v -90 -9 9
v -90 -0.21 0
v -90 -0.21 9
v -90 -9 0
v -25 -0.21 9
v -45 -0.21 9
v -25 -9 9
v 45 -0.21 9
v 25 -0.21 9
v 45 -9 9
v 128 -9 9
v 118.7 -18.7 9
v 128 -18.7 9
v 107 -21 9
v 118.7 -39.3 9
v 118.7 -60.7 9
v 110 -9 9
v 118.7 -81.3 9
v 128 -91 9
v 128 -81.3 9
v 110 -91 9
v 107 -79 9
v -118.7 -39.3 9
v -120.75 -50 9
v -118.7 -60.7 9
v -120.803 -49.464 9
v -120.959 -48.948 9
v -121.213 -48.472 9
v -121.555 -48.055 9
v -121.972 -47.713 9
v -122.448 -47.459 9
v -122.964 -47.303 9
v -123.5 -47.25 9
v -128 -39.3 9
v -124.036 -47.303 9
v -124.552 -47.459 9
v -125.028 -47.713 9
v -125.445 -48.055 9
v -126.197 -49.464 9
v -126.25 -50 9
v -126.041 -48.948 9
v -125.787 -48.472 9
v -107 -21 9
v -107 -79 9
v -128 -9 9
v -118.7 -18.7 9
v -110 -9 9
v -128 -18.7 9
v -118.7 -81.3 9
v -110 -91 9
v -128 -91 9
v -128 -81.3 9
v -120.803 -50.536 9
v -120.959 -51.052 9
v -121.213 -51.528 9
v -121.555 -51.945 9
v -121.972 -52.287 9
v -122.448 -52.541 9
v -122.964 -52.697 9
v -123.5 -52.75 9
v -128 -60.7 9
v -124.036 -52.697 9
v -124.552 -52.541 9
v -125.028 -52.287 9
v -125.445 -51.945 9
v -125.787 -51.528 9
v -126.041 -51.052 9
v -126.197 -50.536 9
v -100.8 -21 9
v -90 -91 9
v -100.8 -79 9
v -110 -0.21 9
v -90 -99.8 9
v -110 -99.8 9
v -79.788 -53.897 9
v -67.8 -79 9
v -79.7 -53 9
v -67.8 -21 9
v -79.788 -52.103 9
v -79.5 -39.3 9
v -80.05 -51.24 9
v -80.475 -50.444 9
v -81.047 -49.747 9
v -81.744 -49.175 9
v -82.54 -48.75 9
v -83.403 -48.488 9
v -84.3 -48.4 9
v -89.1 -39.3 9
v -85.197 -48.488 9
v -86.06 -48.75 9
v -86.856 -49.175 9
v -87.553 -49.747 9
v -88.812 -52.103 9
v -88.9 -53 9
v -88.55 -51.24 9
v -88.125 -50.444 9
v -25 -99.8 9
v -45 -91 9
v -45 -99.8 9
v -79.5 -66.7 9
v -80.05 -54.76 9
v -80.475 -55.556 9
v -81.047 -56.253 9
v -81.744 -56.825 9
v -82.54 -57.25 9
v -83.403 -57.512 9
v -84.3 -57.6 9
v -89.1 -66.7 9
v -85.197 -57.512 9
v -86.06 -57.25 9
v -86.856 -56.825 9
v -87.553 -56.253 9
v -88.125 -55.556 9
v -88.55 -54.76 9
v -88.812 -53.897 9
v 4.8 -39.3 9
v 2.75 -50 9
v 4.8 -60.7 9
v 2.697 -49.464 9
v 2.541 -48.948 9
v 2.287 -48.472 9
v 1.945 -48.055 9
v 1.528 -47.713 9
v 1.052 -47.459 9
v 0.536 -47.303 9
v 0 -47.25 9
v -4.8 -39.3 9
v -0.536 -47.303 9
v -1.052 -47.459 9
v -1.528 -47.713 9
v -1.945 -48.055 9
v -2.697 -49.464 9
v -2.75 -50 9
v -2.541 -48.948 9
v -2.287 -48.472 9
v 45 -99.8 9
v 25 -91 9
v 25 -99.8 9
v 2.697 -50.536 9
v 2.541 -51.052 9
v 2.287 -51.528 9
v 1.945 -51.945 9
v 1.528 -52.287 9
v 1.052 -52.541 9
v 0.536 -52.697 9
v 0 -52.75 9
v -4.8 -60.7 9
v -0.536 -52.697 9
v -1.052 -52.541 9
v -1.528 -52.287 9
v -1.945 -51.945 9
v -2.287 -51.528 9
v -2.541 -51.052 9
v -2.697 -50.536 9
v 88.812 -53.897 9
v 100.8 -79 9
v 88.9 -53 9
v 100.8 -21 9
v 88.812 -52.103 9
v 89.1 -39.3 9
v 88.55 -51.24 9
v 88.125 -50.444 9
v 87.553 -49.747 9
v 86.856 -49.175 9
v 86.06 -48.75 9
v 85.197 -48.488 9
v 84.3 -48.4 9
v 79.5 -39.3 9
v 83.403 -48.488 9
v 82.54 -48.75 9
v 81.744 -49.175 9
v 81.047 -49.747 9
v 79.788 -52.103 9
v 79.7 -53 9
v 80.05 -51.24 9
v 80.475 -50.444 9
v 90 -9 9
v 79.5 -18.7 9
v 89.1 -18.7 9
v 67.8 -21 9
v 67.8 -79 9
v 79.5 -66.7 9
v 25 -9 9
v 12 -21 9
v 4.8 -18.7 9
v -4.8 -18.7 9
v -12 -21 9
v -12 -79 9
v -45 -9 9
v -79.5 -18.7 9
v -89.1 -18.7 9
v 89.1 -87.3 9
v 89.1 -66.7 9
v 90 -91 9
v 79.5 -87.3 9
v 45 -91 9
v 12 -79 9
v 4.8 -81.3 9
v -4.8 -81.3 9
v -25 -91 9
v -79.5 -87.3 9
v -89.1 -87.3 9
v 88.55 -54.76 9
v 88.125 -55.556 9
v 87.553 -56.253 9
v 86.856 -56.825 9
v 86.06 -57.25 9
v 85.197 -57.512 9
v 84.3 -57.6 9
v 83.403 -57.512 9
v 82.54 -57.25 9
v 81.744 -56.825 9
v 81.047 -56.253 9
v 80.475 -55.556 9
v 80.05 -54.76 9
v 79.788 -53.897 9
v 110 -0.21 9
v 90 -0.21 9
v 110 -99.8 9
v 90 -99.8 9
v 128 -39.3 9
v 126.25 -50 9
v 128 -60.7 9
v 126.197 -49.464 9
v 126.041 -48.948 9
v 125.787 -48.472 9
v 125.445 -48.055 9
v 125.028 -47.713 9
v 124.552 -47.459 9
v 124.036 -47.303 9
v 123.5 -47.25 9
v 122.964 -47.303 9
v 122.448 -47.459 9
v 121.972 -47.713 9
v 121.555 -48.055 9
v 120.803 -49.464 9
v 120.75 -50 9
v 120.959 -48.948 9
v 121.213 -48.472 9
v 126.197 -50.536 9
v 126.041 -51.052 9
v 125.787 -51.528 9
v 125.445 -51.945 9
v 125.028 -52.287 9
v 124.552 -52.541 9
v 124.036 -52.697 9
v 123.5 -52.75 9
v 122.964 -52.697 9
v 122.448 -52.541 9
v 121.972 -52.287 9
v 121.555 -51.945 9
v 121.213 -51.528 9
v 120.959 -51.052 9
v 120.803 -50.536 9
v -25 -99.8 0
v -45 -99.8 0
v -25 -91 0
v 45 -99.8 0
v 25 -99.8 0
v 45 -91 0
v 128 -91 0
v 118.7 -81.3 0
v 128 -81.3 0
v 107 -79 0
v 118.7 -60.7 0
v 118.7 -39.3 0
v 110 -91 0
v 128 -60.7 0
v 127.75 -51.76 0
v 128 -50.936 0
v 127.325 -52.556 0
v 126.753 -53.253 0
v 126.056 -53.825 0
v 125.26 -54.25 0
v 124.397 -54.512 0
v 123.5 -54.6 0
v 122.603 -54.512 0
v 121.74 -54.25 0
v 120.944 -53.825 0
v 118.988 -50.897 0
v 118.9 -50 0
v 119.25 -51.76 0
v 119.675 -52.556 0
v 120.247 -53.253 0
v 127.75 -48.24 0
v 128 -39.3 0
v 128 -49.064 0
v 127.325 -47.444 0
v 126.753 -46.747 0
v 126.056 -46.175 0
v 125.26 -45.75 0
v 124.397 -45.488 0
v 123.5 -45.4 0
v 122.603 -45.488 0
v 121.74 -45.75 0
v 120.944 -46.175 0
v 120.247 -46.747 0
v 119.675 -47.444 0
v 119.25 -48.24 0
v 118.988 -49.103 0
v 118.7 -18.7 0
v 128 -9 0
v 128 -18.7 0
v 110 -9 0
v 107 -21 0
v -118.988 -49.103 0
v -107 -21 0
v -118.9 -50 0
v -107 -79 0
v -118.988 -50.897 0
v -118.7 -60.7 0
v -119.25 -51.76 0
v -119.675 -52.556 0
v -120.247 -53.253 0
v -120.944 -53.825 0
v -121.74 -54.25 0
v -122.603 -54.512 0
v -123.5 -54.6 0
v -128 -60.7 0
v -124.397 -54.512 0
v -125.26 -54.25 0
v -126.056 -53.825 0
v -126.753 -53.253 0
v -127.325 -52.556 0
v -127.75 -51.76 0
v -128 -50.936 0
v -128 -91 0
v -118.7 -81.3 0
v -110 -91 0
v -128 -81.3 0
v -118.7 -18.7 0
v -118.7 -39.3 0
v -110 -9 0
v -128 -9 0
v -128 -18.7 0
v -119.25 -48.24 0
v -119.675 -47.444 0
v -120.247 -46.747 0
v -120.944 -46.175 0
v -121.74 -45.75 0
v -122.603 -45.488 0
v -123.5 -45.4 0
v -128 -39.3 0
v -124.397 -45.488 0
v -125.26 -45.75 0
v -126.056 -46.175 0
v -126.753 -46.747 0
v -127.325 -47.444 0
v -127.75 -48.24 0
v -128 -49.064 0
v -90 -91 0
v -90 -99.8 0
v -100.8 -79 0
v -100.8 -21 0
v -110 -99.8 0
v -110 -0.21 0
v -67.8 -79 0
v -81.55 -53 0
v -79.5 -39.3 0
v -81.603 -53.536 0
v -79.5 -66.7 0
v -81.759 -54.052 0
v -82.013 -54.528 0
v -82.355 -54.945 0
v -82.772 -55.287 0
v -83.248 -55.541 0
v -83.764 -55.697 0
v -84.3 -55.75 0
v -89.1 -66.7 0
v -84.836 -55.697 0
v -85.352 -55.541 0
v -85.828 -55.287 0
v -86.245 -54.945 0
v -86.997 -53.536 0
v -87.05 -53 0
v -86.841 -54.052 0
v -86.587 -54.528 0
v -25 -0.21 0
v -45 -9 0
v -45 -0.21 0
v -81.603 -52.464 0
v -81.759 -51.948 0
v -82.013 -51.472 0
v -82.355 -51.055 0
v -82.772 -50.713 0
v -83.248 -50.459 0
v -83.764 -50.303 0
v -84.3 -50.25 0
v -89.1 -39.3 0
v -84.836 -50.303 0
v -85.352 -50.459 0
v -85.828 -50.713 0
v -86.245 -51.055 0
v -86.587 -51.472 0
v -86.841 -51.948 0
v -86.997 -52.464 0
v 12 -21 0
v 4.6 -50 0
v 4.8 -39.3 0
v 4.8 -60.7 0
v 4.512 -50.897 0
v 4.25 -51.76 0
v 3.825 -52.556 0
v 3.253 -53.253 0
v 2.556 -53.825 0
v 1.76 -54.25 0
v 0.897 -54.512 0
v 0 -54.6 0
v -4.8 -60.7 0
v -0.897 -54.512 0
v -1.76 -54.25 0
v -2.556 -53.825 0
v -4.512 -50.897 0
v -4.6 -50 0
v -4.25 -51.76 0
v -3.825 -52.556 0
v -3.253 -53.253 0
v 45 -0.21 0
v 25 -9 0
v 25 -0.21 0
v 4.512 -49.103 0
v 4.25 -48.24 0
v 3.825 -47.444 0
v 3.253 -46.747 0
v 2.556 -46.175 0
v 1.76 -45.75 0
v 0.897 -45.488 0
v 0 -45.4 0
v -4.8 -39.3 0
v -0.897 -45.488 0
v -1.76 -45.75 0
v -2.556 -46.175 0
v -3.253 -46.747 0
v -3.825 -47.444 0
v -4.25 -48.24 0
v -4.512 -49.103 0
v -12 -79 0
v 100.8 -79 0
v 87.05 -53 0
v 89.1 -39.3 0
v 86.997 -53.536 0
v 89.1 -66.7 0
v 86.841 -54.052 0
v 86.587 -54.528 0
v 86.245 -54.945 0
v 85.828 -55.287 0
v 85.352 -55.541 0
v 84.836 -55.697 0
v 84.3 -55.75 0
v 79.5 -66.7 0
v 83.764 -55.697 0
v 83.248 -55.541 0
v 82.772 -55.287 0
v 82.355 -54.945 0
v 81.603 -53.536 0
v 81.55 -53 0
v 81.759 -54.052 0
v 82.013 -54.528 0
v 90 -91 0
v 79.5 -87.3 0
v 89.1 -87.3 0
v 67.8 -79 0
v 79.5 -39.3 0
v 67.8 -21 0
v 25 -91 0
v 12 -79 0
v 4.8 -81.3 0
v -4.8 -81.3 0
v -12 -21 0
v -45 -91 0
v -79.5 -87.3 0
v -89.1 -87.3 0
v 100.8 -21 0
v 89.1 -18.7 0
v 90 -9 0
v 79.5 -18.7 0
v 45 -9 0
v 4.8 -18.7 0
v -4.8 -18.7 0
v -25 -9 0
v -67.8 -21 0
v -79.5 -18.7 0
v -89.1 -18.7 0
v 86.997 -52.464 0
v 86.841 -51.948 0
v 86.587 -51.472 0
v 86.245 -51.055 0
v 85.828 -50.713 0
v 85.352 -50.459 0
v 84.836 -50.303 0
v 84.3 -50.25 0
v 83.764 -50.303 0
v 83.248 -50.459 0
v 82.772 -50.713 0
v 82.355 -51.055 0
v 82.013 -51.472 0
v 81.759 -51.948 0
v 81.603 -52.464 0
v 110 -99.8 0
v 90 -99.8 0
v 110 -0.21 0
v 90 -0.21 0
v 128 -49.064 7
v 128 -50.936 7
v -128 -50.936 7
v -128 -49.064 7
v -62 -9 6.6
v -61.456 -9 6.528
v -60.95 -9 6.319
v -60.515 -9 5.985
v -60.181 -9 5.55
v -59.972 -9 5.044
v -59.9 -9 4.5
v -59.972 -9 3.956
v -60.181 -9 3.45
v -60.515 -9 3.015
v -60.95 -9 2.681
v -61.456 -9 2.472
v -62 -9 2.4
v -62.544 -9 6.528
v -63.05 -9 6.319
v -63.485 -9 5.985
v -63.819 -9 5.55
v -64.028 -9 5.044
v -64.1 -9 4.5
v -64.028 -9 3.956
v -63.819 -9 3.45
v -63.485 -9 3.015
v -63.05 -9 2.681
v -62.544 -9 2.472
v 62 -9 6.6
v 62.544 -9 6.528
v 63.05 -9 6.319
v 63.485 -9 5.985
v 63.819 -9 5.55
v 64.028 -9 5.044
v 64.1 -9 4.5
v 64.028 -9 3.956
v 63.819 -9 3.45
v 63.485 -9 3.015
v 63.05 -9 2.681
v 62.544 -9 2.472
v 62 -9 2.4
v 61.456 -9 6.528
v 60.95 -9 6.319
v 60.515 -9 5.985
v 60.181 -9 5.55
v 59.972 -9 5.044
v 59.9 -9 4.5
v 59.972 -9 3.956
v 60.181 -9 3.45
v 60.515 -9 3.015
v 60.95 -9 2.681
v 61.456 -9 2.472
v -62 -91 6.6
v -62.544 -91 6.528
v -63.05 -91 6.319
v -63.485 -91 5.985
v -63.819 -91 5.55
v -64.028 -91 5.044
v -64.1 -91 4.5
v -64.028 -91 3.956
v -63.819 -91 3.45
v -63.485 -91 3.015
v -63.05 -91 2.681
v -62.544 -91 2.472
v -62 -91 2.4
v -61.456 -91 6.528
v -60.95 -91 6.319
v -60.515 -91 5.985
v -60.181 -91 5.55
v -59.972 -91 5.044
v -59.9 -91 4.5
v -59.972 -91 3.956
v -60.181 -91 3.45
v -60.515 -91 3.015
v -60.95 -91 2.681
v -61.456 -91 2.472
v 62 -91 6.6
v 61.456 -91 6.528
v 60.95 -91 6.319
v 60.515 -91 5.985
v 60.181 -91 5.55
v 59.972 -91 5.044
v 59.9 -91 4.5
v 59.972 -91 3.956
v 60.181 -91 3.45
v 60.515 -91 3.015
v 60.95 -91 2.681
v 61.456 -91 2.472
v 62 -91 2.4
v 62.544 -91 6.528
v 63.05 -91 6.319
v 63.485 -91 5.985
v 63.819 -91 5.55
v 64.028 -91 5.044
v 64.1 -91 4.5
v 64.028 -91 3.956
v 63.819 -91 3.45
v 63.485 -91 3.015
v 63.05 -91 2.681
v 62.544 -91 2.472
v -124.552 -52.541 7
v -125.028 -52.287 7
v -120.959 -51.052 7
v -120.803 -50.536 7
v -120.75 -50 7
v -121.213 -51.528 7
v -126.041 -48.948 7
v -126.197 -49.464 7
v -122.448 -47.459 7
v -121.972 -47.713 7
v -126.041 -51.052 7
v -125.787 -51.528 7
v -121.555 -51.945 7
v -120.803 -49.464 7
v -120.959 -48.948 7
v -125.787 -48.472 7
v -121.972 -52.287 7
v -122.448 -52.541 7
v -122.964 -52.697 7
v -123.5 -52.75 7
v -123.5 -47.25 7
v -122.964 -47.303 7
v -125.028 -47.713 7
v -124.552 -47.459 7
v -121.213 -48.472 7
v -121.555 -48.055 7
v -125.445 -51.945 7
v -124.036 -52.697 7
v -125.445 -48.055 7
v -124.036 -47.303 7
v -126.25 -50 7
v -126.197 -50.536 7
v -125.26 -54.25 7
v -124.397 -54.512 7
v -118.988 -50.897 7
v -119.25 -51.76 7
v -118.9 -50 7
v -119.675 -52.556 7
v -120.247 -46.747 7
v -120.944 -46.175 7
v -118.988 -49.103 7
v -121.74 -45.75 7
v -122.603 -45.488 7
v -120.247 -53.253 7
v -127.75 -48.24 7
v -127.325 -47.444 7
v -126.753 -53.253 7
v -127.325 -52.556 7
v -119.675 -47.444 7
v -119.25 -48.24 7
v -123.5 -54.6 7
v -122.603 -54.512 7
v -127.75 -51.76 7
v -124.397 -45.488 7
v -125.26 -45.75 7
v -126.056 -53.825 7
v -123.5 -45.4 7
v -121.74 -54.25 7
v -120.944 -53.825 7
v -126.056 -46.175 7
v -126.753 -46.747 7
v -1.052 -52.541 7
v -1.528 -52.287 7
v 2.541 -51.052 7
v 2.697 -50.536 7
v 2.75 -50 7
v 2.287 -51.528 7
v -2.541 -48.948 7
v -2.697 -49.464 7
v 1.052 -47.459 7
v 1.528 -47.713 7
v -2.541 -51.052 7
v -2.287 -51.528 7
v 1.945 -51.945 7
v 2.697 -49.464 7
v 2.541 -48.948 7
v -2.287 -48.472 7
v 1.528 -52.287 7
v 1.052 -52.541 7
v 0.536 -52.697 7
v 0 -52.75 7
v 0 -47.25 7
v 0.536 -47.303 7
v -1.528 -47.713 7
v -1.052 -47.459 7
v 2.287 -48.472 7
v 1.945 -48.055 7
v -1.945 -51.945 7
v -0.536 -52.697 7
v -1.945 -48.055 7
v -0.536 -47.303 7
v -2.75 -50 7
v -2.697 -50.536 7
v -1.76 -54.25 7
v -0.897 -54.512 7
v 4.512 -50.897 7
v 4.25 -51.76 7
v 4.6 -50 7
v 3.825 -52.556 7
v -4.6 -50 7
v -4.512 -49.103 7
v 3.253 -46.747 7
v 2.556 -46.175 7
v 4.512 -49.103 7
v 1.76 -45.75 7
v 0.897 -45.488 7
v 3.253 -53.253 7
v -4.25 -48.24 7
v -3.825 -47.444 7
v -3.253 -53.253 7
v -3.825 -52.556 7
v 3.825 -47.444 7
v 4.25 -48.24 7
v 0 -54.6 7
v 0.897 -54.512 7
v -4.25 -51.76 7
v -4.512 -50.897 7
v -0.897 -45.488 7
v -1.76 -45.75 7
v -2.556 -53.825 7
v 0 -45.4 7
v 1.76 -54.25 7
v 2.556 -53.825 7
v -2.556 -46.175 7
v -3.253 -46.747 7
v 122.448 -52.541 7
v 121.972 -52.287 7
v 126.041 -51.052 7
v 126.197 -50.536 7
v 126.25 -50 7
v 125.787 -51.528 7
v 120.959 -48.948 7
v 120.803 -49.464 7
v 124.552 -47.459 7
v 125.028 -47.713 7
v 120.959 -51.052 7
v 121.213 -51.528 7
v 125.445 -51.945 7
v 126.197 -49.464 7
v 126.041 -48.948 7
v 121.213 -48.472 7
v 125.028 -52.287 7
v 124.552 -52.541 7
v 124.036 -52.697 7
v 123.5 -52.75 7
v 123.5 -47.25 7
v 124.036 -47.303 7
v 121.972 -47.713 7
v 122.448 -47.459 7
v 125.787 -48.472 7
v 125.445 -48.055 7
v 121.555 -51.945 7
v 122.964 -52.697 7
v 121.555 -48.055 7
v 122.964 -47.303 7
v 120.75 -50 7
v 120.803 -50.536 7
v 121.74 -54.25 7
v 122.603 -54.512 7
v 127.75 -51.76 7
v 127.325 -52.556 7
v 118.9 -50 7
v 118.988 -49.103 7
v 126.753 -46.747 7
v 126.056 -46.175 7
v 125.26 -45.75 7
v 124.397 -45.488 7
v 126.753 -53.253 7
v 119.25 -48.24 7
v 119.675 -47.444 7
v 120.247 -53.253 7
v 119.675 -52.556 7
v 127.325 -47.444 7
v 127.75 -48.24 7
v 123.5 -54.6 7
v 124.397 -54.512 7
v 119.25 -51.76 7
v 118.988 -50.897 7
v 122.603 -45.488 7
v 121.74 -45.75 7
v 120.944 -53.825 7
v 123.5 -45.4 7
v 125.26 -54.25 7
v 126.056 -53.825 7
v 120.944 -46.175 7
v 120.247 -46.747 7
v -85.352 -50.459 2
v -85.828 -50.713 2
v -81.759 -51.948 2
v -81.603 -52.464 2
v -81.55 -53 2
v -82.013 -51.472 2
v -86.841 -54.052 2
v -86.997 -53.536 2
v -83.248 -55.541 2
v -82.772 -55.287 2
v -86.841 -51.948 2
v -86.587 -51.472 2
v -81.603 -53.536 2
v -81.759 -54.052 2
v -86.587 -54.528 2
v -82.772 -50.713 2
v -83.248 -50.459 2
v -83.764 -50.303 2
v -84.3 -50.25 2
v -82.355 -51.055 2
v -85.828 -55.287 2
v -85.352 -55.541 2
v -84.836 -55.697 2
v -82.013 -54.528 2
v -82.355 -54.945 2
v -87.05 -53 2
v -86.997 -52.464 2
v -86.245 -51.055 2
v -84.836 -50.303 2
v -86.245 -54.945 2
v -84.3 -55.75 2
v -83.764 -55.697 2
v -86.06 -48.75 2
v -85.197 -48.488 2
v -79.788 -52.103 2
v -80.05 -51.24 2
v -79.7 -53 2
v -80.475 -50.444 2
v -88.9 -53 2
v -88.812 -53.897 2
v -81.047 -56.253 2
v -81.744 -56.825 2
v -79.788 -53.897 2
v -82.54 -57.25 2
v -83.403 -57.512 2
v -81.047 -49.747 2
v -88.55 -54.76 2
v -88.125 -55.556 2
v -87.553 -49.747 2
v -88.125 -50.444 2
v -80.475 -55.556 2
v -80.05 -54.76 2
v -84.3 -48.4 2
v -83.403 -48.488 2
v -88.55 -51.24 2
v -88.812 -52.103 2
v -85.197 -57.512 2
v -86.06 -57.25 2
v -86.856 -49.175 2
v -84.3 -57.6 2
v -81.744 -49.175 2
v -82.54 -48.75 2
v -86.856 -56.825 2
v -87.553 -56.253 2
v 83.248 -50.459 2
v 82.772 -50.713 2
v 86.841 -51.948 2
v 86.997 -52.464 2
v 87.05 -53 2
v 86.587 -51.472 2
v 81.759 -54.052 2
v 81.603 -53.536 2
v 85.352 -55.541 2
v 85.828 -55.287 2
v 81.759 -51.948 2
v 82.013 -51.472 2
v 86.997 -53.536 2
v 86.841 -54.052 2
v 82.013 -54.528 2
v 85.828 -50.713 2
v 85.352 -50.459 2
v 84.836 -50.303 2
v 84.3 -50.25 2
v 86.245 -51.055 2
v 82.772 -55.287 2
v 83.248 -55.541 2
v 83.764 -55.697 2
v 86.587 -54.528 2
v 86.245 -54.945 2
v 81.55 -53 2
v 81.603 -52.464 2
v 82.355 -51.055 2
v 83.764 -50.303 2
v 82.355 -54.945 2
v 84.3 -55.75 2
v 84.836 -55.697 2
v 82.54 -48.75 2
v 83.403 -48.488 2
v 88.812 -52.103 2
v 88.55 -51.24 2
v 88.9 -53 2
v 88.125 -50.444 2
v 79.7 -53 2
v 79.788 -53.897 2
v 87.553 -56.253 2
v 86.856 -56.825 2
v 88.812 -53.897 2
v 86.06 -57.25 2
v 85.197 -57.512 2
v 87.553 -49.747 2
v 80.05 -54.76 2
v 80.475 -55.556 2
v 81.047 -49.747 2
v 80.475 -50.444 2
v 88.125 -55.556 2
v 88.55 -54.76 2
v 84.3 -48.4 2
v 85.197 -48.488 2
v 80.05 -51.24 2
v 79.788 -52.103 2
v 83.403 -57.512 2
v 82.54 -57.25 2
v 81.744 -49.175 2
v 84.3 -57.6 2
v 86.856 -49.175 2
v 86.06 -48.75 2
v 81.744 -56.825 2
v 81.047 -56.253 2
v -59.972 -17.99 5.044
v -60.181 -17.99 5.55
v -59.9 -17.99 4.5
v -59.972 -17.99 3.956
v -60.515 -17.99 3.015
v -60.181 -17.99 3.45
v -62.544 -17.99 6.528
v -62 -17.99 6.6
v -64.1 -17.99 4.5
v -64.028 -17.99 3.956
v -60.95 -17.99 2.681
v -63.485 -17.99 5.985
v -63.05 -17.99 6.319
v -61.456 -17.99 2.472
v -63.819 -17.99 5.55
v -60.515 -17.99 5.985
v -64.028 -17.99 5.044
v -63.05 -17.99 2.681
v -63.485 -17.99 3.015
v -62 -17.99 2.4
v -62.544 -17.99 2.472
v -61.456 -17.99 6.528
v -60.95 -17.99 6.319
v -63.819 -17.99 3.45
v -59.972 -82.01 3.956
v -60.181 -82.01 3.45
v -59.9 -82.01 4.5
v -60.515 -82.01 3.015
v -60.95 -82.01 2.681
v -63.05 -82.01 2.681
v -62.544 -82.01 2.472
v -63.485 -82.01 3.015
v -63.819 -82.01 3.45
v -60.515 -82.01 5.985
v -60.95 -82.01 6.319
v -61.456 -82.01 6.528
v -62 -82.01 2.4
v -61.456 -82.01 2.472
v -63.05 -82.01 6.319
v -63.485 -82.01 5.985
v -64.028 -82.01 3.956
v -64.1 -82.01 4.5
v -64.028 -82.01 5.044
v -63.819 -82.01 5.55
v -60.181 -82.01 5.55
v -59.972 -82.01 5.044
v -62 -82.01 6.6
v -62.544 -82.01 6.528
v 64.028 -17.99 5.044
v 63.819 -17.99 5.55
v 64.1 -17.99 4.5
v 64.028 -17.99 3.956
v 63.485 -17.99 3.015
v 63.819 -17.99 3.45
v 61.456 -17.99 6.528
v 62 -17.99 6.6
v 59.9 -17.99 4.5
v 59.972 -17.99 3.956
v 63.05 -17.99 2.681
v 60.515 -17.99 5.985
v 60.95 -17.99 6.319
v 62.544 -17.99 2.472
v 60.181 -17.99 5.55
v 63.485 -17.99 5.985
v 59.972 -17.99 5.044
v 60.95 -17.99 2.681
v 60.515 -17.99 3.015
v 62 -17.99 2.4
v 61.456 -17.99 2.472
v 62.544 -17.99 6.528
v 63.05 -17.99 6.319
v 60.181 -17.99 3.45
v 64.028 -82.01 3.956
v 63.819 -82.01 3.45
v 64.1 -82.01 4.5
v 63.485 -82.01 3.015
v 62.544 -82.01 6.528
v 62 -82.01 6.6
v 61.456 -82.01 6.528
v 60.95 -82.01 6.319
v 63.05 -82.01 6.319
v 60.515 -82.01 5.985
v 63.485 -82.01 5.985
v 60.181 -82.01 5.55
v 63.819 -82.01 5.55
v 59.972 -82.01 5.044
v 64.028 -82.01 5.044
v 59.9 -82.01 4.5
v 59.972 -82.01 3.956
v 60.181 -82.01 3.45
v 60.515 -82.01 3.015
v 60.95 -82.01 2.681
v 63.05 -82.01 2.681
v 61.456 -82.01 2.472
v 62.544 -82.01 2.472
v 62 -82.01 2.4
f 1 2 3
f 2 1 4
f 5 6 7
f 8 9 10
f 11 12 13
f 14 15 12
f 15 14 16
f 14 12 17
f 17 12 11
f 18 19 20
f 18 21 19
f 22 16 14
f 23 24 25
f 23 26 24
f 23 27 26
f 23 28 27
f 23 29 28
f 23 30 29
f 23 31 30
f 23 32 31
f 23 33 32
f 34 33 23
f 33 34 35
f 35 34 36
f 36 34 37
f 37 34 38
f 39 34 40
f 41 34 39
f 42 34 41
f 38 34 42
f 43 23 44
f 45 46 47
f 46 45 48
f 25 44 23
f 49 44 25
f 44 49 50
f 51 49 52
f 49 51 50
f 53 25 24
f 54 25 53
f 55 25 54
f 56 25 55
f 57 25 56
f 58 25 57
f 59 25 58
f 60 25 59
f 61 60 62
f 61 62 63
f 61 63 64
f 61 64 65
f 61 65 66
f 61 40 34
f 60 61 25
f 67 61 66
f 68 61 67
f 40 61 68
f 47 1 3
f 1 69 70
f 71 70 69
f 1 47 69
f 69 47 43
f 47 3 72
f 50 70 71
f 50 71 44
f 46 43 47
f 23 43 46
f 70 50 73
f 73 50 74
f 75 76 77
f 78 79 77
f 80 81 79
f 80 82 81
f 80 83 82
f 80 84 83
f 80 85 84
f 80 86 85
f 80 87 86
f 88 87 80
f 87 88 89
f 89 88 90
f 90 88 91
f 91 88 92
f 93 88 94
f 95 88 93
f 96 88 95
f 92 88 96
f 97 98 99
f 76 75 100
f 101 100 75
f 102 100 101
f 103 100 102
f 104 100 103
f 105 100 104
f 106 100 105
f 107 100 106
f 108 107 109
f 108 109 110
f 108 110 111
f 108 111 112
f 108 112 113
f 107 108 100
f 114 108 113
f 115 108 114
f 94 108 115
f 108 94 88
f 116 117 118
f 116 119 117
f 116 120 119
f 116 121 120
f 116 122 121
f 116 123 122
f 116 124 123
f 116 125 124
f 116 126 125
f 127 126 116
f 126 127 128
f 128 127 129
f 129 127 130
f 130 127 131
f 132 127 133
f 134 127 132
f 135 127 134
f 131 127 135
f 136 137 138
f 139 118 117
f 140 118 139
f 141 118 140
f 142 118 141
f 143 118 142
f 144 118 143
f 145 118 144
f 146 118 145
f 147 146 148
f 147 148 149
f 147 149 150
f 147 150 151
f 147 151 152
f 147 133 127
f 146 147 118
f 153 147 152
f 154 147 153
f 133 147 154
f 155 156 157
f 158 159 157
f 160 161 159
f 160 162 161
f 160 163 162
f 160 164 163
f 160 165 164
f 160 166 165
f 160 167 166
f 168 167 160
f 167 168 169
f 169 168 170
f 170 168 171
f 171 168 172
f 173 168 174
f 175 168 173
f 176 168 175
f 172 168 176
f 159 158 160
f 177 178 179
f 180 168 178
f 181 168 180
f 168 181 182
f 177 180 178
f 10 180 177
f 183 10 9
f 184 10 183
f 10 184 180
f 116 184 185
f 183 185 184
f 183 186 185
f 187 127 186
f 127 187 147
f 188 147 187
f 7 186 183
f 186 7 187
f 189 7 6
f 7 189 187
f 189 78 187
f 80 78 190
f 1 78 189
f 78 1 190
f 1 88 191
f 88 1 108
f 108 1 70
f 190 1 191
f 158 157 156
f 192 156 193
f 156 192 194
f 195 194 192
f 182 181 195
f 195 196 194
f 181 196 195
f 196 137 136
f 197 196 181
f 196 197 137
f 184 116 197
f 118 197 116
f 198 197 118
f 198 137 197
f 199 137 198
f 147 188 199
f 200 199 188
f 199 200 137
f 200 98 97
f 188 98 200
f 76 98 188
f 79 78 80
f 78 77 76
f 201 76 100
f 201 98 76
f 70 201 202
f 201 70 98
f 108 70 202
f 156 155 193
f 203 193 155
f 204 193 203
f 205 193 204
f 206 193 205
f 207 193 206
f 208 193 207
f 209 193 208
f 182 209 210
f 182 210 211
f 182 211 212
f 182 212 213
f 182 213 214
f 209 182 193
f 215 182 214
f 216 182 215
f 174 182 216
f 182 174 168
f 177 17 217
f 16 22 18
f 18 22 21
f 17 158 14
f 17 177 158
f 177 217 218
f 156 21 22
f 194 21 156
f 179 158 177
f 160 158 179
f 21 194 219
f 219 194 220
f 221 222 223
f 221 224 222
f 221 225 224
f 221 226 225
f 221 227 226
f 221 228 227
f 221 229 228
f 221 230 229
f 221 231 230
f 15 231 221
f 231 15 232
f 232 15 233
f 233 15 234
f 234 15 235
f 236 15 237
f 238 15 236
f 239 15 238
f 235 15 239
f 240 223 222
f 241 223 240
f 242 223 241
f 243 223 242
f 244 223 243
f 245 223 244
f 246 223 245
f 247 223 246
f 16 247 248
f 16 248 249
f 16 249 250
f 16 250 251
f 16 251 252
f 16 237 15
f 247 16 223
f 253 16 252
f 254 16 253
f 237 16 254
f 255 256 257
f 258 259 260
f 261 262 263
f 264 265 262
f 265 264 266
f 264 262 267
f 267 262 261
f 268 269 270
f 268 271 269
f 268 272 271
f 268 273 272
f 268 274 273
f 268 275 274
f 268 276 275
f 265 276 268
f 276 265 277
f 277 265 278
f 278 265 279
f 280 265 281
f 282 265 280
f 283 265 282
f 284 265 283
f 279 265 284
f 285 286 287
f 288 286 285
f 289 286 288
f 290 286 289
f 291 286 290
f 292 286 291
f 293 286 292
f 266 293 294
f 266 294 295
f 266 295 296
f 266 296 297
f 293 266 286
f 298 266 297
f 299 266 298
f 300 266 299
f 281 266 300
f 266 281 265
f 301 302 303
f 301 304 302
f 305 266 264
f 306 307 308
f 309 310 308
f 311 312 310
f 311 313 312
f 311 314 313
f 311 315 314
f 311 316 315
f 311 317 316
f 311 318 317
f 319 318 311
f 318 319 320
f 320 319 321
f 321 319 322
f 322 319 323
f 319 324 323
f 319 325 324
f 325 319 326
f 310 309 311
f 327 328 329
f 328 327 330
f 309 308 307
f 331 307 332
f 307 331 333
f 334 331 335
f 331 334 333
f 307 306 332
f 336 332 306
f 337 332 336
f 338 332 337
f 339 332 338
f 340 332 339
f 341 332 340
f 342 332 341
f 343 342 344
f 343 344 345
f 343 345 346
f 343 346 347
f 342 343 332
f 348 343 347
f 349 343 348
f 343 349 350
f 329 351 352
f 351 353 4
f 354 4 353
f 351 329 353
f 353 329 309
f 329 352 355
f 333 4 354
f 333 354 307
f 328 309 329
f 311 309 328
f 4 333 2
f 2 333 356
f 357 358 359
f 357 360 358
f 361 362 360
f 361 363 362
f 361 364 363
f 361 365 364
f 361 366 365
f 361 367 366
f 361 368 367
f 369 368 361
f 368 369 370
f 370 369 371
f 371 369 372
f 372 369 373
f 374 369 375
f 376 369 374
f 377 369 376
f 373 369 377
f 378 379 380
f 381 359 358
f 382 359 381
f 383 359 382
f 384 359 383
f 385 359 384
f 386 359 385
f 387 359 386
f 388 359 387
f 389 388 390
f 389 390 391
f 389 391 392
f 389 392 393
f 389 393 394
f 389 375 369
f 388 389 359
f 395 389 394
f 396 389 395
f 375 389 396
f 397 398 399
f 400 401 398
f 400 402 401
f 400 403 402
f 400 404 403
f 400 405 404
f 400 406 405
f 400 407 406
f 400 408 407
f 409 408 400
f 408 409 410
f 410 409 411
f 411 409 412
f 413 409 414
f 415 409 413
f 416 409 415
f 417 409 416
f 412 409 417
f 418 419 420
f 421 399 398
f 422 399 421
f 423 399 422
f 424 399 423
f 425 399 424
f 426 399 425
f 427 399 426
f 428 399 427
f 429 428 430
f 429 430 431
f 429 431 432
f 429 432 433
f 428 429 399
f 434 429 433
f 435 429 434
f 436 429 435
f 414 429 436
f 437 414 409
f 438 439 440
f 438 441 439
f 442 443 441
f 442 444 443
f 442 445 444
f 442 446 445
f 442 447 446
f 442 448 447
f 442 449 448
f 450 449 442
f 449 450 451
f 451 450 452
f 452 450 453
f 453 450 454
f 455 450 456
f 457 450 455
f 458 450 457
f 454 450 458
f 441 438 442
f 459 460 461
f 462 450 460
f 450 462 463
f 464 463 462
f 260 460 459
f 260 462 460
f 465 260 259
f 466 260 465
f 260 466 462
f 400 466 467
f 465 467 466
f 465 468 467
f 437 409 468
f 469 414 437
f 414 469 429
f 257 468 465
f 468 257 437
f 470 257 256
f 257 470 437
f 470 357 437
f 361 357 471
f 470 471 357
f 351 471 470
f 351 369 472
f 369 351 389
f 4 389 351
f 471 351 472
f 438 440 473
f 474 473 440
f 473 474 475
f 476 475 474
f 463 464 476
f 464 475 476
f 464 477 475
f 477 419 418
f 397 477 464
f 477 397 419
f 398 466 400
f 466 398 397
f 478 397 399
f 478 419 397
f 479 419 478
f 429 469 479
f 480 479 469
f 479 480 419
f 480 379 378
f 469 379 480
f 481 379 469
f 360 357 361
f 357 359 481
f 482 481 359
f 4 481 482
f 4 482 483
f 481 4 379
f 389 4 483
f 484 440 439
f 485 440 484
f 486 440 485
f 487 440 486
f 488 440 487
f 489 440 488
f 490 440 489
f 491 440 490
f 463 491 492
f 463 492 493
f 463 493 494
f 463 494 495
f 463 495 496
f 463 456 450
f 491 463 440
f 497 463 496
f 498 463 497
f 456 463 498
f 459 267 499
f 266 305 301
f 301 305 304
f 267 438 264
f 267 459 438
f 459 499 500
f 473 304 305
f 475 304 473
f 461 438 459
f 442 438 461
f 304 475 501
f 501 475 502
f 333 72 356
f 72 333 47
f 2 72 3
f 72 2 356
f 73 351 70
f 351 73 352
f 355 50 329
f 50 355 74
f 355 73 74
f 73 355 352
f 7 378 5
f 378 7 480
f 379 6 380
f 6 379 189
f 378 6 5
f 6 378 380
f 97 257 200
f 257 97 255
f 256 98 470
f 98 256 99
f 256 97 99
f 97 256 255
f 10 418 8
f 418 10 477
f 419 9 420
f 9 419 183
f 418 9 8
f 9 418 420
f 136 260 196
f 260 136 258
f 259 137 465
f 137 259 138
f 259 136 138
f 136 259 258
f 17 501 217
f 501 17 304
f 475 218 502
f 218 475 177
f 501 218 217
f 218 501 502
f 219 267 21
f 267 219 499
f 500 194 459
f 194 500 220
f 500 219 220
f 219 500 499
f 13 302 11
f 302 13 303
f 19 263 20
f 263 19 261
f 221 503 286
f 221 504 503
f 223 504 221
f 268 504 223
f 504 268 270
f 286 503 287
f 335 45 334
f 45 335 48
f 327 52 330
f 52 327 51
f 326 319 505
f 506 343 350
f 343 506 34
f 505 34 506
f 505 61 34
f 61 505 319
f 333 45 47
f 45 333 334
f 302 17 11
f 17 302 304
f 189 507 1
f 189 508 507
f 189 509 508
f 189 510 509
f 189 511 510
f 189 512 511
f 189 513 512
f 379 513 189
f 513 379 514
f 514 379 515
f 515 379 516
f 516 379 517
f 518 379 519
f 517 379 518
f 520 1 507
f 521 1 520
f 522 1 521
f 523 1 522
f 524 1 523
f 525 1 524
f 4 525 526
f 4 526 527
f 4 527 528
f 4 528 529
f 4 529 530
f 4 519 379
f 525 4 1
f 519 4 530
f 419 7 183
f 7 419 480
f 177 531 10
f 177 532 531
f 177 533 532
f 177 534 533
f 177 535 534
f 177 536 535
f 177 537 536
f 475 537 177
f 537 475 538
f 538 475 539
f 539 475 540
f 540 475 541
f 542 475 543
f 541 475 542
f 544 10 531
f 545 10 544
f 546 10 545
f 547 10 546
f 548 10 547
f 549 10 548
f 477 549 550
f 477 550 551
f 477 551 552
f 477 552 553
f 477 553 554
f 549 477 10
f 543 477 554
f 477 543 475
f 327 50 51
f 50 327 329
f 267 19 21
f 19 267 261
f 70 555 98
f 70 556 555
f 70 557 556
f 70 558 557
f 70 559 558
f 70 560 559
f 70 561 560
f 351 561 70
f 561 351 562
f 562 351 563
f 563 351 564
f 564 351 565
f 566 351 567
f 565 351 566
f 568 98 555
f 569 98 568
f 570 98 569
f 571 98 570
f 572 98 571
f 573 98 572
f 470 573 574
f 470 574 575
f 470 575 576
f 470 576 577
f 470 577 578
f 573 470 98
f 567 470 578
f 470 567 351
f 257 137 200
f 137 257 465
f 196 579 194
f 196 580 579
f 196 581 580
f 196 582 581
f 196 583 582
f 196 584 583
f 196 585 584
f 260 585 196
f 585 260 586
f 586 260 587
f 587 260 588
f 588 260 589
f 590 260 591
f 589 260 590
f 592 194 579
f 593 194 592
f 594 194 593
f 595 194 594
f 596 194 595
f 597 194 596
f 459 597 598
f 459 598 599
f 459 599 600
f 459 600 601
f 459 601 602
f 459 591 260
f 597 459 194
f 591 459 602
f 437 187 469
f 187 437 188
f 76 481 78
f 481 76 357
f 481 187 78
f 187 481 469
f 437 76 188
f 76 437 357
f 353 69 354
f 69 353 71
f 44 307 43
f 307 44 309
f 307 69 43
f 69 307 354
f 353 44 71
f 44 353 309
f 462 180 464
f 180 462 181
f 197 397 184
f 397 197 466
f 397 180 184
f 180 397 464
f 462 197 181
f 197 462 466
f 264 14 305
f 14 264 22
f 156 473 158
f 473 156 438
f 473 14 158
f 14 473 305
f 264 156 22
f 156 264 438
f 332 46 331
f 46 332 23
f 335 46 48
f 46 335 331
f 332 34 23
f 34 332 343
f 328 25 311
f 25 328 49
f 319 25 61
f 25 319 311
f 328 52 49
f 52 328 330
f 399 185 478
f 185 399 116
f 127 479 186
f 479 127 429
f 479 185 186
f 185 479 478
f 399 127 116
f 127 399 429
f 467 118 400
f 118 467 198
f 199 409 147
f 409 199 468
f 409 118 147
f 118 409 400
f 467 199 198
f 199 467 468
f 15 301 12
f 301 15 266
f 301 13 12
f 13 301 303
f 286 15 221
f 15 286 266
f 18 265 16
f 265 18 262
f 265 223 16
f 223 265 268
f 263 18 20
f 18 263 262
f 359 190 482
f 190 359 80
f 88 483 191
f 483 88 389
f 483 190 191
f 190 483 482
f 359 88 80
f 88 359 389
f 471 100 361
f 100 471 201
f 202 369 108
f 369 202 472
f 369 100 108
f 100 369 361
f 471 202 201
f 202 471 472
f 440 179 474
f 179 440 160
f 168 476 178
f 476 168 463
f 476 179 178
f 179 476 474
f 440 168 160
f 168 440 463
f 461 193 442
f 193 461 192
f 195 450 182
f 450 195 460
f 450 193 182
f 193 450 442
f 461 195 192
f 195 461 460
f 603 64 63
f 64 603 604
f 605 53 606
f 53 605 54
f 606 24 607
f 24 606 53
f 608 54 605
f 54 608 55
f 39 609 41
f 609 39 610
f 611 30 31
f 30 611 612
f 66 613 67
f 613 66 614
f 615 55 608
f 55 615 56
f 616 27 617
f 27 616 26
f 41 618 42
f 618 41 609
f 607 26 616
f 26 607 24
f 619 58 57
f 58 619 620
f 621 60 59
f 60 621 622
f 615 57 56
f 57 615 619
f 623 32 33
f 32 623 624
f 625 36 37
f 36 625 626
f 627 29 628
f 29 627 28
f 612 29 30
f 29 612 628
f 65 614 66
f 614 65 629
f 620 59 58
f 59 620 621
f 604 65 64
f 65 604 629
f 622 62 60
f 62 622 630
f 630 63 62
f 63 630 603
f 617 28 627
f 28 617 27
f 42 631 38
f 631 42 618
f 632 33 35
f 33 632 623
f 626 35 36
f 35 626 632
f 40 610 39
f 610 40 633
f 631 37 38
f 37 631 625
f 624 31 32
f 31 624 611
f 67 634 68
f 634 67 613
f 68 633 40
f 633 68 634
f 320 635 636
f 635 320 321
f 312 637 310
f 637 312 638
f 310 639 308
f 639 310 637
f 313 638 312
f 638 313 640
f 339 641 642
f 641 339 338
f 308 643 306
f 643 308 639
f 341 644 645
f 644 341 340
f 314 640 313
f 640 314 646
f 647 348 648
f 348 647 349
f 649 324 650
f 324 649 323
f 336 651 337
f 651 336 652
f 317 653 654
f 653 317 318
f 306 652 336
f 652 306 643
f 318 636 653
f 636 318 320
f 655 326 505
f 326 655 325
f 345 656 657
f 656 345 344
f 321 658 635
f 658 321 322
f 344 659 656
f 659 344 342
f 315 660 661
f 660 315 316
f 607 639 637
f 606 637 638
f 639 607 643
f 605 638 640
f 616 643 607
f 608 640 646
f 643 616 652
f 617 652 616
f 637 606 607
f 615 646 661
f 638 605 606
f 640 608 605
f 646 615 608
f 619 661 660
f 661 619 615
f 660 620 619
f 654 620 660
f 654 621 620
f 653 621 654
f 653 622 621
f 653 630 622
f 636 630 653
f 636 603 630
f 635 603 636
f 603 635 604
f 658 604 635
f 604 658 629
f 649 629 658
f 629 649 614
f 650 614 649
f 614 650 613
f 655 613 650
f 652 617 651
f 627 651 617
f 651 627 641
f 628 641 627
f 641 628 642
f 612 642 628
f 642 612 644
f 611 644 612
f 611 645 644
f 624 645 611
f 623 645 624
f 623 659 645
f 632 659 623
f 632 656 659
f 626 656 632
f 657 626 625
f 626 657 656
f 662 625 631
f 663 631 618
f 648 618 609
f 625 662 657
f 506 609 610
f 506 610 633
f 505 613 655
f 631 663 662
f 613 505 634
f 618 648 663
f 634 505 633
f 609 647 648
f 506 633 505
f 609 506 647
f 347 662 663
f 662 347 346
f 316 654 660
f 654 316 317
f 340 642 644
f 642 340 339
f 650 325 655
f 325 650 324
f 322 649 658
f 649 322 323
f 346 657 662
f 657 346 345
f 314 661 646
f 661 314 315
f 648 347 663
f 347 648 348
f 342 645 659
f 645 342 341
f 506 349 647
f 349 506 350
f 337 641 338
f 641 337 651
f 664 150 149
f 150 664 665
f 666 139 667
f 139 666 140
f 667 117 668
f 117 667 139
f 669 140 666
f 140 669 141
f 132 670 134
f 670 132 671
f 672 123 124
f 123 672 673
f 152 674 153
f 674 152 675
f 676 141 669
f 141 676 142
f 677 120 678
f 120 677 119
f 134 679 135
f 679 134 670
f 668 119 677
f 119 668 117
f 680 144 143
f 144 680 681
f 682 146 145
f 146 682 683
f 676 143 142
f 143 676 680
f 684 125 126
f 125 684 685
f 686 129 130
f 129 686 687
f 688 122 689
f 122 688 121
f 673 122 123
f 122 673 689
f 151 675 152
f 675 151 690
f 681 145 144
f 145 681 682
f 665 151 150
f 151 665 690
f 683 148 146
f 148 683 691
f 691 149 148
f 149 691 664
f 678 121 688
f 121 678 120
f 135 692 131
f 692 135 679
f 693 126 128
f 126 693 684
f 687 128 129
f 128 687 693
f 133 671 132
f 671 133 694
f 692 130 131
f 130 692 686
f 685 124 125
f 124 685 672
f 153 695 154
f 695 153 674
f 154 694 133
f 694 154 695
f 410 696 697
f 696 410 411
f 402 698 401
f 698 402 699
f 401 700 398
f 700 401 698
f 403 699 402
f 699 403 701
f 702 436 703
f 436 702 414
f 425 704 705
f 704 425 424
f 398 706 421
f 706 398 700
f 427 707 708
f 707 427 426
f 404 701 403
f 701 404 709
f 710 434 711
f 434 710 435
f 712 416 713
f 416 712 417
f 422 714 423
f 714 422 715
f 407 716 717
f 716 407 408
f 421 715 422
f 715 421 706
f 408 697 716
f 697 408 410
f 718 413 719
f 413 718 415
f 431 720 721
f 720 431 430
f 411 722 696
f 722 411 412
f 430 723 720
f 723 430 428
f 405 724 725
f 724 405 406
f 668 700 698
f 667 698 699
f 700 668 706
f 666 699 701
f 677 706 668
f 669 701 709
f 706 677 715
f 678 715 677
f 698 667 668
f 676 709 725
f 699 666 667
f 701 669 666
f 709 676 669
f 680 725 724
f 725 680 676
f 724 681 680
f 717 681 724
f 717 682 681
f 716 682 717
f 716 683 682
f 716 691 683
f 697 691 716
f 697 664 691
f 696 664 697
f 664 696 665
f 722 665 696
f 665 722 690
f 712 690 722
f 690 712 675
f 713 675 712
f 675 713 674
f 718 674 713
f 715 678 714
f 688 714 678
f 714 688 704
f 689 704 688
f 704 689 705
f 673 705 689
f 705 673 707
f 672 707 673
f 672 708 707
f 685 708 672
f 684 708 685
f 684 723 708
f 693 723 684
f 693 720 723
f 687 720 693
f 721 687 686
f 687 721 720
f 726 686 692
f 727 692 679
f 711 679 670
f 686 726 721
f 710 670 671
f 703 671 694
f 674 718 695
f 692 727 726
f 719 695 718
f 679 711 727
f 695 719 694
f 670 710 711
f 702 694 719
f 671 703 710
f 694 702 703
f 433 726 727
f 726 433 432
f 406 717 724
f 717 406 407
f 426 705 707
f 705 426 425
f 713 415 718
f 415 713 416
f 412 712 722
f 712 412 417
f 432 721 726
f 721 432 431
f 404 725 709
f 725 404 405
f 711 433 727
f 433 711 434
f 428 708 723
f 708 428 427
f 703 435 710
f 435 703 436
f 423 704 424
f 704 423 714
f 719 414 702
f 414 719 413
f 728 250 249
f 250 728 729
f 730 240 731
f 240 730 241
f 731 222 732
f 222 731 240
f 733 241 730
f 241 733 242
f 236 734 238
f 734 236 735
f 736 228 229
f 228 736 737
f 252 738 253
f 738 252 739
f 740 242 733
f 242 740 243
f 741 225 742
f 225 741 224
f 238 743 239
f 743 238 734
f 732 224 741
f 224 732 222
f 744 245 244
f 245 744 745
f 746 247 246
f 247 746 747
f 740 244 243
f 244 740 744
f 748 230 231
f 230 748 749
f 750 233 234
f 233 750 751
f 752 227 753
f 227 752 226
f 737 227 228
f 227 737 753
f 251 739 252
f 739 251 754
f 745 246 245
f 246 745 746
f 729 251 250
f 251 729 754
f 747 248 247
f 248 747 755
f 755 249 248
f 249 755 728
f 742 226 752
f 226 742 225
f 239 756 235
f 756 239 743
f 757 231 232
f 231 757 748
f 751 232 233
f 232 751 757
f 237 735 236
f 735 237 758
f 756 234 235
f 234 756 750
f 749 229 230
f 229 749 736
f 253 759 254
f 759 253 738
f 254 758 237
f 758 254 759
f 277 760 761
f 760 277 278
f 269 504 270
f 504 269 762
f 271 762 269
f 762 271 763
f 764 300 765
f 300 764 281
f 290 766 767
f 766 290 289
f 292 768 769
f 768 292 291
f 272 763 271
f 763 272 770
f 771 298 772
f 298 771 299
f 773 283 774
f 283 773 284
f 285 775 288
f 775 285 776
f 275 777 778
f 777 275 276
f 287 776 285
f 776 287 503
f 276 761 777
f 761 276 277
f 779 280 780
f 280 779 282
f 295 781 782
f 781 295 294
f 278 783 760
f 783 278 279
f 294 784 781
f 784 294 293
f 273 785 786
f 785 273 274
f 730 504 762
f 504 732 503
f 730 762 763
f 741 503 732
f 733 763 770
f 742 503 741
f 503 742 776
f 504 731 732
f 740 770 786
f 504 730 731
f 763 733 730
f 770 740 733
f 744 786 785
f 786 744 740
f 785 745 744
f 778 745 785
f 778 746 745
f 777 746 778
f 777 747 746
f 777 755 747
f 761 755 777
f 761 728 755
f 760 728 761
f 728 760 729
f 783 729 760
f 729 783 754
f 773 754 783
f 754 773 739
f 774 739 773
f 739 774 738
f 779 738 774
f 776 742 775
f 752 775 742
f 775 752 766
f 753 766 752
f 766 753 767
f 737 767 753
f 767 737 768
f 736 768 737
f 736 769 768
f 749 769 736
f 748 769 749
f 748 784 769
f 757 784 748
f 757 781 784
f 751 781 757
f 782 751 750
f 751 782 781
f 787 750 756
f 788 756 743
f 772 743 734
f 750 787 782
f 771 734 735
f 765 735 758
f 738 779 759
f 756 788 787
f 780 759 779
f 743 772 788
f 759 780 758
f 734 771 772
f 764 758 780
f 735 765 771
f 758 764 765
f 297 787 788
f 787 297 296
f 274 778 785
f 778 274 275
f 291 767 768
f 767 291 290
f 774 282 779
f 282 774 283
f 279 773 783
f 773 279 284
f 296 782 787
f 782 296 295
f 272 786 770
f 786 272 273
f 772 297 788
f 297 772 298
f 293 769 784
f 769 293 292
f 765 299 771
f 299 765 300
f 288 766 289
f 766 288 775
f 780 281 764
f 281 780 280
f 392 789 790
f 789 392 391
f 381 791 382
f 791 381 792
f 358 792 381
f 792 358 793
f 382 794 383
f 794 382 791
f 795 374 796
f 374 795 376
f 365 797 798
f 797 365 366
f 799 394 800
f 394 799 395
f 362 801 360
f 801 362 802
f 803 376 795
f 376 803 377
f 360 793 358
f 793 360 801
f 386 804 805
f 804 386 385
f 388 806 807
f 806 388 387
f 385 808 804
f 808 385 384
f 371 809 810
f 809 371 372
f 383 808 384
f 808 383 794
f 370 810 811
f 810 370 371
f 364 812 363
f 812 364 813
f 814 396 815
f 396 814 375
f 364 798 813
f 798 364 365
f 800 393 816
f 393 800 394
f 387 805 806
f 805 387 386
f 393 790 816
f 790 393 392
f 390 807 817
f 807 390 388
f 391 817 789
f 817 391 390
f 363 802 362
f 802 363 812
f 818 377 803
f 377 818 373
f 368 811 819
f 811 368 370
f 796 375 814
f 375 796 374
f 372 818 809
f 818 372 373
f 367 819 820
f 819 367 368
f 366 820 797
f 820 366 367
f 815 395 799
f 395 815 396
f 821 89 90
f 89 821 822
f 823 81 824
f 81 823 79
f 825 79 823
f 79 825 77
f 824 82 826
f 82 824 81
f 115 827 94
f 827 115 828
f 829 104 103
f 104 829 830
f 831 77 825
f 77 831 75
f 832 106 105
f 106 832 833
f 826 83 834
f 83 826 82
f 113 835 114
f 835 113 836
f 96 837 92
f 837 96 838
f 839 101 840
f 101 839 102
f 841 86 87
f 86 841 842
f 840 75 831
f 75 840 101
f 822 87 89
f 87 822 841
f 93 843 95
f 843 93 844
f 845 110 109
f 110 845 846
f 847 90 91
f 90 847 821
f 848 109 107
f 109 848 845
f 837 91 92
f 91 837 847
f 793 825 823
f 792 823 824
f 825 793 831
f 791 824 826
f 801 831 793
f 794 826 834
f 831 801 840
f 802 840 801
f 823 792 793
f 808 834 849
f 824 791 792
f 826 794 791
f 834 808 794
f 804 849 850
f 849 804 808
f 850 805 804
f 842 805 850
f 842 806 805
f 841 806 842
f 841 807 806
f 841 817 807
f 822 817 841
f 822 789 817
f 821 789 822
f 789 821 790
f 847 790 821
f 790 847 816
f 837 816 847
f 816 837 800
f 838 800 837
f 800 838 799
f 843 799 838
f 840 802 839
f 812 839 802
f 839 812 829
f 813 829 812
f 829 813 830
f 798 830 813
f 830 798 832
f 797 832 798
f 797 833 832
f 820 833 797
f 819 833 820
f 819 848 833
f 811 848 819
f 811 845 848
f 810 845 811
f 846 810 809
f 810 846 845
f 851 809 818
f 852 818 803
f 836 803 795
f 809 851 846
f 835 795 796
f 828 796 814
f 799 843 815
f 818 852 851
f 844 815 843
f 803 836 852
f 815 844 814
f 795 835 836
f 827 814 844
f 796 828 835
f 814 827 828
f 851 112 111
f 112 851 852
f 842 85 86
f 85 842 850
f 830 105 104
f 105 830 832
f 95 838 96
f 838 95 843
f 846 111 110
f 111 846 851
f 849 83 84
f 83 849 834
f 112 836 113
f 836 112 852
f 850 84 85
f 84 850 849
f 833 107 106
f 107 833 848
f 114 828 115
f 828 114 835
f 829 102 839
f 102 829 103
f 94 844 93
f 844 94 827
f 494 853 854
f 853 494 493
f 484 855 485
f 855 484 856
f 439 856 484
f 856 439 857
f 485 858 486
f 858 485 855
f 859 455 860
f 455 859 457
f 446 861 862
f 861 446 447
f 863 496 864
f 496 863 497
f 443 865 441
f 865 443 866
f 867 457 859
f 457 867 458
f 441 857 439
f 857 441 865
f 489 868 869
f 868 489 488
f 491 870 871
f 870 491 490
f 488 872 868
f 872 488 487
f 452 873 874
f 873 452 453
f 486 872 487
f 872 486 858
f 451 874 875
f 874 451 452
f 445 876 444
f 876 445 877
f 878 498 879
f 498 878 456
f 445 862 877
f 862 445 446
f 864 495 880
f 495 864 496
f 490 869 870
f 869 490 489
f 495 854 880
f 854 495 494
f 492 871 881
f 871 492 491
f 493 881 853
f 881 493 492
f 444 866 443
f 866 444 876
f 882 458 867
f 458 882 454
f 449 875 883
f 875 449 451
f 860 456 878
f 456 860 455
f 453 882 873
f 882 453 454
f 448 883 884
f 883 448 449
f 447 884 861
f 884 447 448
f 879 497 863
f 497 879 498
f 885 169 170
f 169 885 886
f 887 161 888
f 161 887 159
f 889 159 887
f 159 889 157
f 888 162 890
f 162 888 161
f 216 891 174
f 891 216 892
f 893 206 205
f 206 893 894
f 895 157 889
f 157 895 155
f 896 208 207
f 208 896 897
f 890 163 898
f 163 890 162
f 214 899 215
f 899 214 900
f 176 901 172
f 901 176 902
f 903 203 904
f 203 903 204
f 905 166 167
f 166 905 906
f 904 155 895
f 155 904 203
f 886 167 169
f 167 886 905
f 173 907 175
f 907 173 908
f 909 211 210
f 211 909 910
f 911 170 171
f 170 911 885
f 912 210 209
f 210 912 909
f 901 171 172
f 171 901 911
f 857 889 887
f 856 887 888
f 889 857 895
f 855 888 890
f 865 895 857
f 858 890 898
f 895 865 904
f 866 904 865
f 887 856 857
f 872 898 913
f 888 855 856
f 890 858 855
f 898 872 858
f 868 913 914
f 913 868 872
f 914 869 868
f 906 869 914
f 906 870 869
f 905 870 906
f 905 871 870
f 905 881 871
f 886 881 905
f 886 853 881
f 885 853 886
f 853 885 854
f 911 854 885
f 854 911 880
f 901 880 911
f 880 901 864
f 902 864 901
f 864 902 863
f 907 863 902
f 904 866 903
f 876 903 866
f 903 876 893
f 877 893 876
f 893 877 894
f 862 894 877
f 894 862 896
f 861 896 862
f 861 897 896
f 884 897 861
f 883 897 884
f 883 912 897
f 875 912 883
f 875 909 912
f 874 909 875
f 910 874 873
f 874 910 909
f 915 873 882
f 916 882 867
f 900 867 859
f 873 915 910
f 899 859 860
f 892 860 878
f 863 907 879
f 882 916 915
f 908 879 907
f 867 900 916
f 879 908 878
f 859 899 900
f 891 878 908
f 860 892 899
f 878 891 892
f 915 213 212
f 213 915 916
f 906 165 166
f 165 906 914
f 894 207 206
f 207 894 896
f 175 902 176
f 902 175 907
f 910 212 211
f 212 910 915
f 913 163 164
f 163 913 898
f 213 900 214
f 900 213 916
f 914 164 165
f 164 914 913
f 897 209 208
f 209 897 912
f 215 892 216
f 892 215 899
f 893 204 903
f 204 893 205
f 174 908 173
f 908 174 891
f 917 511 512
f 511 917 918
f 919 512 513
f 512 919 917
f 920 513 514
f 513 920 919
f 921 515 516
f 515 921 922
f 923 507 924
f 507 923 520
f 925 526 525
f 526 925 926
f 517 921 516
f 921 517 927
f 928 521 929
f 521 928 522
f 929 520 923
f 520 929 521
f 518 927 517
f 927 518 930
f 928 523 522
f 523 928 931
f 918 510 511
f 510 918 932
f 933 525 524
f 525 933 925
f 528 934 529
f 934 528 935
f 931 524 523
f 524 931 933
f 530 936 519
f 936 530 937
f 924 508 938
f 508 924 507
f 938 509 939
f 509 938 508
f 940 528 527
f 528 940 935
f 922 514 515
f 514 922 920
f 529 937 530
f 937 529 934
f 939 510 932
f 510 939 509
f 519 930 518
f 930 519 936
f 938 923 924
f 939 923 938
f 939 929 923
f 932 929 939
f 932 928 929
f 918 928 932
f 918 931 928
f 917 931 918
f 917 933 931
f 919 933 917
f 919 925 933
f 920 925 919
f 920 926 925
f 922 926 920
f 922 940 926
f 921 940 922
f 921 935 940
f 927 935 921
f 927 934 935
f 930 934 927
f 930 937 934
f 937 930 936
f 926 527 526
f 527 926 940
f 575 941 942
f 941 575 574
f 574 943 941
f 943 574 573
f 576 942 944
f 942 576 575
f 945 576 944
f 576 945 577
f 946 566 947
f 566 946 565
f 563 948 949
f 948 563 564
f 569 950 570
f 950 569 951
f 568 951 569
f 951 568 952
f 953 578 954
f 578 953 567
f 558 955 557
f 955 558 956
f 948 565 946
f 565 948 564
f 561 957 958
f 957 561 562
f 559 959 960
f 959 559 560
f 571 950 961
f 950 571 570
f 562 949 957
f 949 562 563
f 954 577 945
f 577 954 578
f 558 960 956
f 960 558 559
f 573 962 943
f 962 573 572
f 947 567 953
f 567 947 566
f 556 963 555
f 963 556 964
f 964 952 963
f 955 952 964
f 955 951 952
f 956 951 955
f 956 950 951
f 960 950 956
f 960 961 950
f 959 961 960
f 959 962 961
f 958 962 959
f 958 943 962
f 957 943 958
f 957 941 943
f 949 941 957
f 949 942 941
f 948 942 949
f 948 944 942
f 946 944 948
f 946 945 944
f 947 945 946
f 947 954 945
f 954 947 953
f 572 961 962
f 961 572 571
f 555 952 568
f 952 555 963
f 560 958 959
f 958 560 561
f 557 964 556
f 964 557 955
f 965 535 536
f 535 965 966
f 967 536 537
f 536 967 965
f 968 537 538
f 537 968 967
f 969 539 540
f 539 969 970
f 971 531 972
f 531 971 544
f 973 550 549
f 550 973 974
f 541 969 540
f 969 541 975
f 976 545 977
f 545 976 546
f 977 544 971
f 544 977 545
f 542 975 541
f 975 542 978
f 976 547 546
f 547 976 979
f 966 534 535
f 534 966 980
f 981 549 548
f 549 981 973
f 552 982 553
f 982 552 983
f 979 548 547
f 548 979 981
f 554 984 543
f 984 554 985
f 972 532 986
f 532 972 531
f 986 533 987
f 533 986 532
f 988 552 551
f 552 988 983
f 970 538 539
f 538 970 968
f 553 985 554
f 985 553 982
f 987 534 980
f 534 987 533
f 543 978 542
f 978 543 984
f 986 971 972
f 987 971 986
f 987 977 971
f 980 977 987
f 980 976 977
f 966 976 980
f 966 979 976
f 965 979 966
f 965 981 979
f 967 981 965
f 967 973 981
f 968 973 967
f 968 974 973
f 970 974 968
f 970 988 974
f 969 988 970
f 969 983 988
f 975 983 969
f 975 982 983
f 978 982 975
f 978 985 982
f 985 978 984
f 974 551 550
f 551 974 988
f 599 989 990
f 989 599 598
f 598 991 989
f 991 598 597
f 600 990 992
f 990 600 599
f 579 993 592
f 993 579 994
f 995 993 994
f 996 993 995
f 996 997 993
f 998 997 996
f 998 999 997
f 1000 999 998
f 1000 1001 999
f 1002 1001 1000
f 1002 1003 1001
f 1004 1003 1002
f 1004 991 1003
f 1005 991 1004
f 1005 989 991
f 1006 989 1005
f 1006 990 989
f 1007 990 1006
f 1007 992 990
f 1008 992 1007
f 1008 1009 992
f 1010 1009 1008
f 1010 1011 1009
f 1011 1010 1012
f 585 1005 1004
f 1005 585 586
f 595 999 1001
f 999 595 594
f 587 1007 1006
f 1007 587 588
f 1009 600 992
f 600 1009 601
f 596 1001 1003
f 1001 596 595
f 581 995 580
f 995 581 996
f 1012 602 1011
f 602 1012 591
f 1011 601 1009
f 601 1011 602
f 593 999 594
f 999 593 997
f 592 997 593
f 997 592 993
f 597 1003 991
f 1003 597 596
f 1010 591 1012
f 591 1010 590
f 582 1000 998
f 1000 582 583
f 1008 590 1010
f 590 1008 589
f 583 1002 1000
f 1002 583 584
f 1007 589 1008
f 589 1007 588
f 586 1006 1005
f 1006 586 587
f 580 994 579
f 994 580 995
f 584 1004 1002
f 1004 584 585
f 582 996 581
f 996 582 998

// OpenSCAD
include <../lib/meshtastic-drybag-node-lib.scad>;
$fn = 40;
bottom_plate_print();
